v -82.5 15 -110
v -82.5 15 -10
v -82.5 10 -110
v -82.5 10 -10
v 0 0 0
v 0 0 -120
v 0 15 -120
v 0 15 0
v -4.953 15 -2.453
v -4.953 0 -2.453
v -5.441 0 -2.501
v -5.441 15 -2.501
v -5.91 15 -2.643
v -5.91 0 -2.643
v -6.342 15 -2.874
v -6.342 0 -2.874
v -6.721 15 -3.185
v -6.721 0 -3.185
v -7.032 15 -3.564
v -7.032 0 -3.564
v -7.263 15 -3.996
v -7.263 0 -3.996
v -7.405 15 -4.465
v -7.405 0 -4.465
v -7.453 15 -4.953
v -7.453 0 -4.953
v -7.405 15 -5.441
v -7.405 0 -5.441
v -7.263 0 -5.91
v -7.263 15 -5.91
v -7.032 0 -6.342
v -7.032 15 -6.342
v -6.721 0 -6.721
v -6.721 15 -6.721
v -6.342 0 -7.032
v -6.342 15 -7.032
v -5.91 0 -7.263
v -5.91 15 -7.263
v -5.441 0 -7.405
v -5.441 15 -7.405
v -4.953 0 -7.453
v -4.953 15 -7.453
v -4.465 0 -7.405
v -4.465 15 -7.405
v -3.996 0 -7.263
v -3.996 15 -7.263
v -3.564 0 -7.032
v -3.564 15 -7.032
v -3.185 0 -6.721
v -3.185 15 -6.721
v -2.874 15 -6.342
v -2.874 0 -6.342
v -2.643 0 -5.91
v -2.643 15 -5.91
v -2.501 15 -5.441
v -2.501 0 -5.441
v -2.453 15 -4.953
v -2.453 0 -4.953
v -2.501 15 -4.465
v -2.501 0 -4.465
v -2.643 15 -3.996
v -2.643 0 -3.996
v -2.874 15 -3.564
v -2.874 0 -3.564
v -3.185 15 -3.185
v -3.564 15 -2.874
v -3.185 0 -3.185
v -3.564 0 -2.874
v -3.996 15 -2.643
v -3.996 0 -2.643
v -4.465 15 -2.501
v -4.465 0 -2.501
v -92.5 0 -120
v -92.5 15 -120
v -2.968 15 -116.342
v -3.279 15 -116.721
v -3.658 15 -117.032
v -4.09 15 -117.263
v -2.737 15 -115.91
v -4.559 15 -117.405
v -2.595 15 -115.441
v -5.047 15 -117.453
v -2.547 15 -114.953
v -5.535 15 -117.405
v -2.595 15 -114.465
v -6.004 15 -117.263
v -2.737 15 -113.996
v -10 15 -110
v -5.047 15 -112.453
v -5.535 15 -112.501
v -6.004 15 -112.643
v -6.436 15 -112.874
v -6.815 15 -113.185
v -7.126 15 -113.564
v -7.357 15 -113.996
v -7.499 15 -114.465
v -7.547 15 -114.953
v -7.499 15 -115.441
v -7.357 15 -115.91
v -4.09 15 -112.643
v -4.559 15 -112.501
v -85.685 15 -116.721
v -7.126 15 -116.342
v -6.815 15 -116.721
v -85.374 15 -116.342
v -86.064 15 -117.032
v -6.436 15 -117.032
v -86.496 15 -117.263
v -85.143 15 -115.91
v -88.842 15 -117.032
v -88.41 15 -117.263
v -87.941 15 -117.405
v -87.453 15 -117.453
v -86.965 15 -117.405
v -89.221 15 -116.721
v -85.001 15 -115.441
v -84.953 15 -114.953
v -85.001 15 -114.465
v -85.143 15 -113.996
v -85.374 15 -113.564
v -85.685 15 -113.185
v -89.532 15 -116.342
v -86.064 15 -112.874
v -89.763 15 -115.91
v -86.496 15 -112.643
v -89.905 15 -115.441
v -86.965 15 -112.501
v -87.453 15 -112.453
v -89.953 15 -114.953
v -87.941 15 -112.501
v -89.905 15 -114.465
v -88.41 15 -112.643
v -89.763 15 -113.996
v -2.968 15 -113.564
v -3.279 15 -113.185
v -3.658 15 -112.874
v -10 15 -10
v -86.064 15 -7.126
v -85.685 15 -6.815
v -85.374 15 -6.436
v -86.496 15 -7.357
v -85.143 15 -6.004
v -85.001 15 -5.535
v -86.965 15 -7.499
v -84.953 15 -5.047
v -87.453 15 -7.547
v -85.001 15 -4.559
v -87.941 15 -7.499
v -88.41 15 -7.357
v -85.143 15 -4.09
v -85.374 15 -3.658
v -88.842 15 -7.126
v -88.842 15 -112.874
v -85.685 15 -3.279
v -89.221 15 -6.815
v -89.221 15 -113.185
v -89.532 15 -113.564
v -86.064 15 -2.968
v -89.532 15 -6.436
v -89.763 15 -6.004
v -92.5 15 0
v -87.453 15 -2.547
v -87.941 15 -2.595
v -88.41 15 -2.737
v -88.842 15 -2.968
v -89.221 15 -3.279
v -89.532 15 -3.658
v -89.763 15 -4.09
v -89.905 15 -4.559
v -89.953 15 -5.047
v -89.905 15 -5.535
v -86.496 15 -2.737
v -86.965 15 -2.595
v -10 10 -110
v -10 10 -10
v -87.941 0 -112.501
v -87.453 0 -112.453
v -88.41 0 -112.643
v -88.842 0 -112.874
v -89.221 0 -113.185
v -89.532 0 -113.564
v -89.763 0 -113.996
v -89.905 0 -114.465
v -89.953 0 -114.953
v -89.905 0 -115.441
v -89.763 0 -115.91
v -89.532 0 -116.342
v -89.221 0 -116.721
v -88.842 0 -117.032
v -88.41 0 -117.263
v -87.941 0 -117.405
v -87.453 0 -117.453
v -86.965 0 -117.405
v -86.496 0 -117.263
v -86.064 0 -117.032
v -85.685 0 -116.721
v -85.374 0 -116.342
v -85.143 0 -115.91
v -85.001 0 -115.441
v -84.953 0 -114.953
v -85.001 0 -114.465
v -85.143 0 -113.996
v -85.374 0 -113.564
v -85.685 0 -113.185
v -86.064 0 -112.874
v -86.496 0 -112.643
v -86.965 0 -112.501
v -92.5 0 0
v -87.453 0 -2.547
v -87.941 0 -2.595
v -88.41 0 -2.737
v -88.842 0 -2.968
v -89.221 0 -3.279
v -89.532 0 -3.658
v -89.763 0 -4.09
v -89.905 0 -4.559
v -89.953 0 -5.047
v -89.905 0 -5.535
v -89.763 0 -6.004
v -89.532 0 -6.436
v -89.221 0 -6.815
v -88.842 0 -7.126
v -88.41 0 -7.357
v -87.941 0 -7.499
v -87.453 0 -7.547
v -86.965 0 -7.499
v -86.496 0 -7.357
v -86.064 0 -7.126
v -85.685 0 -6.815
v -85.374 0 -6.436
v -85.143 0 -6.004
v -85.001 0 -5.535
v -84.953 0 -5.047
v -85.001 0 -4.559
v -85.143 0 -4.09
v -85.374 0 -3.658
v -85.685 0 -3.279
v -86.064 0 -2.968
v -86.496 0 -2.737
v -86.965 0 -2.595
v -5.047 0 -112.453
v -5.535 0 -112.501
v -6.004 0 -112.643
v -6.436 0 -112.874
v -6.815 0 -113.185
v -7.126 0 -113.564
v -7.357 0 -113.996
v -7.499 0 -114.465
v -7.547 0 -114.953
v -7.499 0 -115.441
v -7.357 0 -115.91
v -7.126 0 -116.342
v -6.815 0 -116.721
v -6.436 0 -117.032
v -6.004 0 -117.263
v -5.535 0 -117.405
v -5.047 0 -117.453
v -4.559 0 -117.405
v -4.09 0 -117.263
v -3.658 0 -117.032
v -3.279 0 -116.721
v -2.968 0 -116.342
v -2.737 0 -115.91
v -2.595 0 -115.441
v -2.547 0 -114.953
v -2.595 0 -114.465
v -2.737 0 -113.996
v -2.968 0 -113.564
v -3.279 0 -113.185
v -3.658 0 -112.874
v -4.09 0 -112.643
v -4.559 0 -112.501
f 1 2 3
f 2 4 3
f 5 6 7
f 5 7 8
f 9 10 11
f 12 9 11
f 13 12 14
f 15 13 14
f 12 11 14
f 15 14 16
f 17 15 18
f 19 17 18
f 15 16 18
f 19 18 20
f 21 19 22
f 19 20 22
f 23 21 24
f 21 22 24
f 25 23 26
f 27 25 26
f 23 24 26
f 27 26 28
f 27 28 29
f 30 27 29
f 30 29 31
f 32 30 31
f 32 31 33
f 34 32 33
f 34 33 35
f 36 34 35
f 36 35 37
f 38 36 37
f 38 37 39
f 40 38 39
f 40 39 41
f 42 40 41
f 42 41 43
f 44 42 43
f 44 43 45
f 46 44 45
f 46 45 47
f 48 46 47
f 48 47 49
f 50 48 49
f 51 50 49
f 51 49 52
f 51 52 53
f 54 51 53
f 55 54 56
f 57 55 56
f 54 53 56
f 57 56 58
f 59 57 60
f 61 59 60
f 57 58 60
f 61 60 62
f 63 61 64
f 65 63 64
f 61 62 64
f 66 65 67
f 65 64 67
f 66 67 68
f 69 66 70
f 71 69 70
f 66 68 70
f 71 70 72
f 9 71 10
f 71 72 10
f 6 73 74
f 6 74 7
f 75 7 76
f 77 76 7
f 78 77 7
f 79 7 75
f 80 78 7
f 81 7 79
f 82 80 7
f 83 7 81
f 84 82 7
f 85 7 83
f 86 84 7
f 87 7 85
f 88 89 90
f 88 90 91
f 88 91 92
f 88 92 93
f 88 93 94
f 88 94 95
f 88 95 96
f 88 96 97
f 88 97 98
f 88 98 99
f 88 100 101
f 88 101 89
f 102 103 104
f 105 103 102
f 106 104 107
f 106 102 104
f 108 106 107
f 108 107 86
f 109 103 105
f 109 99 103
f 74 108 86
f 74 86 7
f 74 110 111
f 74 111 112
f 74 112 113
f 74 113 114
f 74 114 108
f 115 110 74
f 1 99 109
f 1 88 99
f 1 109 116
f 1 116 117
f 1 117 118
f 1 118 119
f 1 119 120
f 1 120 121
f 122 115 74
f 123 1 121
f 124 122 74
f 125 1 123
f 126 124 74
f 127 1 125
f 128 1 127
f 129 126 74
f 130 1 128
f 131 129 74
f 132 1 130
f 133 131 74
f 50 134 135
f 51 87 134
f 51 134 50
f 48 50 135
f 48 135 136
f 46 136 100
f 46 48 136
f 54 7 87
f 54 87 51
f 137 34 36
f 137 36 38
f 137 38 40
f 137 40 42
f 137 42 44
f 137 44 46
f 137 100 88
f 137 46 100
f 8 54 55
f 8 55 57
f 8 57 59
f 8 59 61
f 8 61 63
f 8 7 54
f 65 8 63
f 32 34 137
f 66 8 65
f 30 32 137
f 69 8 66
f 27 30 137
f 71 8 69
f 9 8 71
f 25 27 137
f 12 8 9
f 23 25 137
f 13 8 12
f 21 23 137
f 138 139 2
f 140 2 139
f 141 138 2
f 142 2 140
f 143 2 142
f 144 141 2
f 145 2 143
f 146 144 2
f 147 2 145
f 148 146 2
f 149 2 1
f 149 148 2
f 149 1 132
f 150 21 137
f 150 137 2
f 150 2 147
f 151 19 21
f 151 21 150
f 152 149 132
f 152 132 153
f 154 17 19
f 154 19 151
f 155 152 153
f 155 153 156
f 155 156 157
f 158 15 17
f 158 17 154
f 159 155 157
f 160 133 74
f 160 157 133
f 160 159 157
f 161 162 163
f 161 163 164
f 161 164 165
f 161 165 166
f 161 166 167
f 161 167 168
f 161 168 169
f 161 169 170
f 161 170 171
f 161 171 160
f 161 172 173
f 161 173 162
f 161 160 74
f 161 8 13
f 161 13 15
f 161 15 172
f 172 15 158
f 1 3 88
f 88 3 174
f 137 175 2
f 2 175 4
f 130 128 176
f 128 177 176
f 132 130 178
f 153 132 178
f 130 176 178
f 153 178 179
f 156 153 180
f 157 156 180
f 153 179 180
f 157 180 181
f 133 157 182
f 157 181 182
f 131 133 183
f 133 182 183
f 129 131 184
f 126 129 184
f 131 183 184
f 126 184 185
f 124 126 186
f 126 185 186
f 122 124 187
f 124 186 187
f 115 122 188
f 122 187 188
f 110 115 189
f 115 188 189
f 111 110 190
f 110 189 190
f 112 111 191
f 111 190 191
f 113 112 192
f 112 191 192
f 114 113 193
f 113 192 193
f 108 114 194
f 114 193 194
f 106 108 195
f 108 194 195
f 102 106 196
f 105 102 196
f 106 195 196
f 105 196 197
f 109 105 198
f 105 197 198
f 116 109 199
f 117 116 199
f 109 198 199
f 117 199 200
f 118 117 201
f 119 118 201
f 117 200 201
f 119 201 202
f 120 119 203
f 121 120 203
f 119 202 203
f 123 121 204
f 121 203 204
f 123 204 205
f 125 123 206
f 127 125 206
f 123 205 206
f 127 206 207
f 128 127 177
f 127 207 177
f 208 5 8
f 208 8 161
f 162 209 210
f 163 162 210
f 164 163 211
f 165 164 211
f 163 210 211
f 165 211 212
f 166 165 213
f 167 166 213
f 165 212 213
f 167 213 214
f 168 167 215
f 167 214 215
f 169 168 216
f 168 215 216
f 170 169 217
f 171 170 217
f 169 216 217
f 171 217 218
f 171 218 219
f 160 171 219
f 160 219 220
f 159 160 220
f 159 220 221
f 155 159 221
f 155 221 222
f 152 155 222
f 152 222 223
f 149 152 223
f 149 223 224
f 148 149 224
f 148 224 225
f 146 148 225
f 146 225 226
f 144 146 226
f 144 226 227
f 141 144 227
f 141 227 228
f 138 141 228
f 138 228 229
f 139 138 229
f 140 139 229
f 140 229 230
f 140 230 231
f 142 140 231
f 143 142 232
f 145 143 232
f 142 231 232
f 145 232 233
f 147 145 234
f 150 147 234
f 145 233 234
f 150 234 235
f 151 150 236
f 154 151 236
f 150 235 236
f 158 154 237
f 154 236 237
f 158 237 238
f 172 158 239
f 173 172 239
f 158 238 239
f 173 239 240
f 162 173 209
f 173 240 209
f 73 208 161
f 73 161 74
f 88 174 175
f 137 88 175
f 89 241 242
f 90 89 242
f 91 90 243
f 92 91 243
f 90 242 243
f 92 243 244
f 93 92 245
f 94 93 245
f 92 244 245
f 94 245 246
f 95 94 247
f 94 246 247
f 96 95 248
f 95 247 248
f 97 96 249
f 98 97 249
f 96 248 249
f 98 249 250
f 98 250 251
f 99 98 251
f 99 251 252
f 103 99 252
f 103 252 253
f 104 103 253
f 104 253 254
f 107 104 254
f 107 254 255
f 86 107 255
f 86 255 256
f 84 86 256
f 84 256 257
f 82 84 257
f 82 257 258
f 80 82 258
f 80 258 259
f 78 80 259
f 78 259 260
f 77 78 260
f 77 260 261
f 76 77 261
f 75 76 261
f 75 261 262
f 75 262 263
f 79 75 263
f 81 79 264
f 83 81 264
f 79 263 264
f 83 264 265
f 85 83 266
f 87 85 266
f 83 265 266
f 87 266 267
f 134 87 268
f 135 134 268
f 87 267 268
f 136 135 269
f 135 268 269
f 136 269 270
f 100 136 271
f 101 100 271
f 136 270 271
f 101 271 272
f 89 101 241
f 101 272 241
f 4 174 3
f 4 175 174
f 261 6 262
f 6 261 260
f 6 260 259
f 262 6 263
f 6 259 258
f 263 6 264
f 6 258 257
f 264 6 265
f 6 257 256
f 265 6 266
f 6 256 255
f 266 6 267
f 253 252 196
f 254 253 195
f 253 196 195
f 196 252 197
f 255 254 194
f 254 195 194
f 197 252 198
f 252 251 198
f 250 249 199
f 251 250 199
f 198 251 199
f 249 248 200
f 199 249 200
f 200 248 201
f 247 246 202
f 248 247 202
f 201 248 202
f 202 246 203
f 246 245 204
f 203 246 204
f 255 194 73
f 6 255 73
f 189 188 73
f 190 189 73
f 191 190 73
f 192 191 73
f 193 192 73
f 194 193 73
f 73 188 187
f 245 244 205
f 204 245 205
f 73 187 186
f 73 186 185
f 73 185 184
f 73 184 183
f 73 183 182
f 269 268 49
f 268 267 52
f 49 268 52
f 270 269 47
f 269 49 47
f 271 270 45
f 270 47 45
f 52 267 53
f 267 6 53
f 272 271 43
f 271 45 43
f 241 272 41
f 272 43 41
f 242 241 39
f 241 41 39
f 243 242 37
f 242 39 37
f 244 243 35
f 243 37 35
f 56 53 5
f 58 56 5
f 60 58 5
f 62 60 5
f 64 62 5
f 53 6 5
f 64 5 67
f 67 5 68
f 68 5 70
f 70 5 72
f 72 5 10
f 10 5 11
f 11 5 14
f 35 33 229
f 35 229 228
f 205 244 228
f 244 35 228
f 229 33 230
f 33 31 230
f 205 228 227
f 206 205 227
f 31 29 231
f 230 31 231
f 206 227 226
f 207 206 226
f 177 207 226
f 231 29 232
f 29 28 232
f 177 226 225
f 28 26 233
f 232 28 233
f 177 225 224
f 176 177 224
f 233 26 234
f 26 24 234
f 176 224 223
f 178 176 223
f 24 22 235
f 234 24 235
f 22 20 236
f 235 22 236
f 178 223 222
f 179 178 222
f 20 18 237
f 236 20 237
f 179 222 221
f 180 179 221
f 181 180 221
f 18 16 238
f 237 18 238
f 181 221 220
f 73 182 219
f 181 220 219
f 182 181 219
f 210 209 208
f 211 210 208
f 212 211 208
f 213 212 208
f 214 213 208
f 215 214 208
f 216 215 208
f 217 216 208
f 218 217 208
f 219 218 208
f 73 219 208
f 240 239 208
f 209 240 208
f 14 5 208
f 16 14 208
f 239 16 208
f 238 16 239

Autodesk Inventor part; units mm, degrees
ref_plane "YZ Plane" through (0, 0, 0) normal (1, 0, 0) x (0, 1, 0)
ref_plane "XZ Plane" through (0, 0, 0) normal (0, 1, 0) x (-1, 0, 0)
ref_plane "XY Plane" through (0, 0, 0) normal (0, 0, 1) x (1, 0, 0)
sketch "Sketch1" plane through (0, 0, 0) normal (0, 1, 0) x (-1, 0, 0)
  line L0 (0, 0) -> (92.5, 0)
  line L1 (92.5, 0) -> (92.5, -120)
  line L2 (92.5, -120) -> (0, -120)
  line L3 (0, -120) -> (0, 0)
  dimension "d0" = 120
  dimension "d1" = 92.5
extrude "Extrusion1" add sketch "Sketch1" along normal blind 15
shell "Shell1" thickness 10 removed faces 1 at (-30.8333, 15, -80)
sketch "Sketch3" plane through (0, 15, 0) normal (0, 1, 0) x (1, 0, 0)
  line L0 (-92.5, 0) -> (0, 0) projected
  line L1 (0, 0) -> (0, 4.953)
  line L2 (0, 0) -> (0, 120) projected
  line L3 (-4.953, 4.953) -> (0, 4.953)
  line L4 (-4.953, 4.953) -> (-4.953, 0)
  dimension "d5" = 4.953
  dimension "d6" = 4.953
hole "Hole1" at (-4.953, 15, -4.953) direction (0, -1, 0) diameter 5 end through all
sketch "Sketch5" plane through (0, 15, 0) normal (0, 1, 0) x (1, 0, 0)
  line L0 (-82.5, 10) -> (-82.5, 110) projected
  line L1 (-82.5, 10) -> (-87.453, 10)
  line L2 (-87.453, 10) -> (-87.453, 5.047)
  point P0 (0, 0)
  dimension "d14" = 4.953
  dimension "d15" = 4.953
hole "Hole2" at (-87.453, 15, -5.047) direction (0, -1, 0) diameter 5 end through all
sketch "Sketch6" plane through (0, 15, 0) normal (0, 1, 0) x (1, 0, 0)
  line L0 (-82.5, 110) -> (-10, 110) projected
  line L1 (-82.5, 110) -> (-82.5, 114.953)
  line L2 (-82.5, 114.953) -> (-87.453, 114.953)
  point P0 (0, 0)
  dimension "d23" = 4.953
  dimension "d24" = 4.953
hole "Hole3" at (-87.453, 15, -114.953) direction (0, -1, 0) diameter 5 end through all
sketch "Sketch7" plane through (0, 15, 0) normal (0, 1, 0) x (1, 0, 0)
  line L0 (-82.5, 110) -> (-10, 110) projected
  line L1 (-10, 110) -> (-10, 114.953)
  line L2 (-10, 114.953) -> (-5.047, 114.953)
  point P0 (0, 0)
  dimension "d32" = 4.953
  dimension "d33" = 4.953
hole "Hole4" at (-5.047, 15, -114.953) direction (0, -1, 0) diameter 5 end through all
properties part number "Water_Proof_Box_Top"
